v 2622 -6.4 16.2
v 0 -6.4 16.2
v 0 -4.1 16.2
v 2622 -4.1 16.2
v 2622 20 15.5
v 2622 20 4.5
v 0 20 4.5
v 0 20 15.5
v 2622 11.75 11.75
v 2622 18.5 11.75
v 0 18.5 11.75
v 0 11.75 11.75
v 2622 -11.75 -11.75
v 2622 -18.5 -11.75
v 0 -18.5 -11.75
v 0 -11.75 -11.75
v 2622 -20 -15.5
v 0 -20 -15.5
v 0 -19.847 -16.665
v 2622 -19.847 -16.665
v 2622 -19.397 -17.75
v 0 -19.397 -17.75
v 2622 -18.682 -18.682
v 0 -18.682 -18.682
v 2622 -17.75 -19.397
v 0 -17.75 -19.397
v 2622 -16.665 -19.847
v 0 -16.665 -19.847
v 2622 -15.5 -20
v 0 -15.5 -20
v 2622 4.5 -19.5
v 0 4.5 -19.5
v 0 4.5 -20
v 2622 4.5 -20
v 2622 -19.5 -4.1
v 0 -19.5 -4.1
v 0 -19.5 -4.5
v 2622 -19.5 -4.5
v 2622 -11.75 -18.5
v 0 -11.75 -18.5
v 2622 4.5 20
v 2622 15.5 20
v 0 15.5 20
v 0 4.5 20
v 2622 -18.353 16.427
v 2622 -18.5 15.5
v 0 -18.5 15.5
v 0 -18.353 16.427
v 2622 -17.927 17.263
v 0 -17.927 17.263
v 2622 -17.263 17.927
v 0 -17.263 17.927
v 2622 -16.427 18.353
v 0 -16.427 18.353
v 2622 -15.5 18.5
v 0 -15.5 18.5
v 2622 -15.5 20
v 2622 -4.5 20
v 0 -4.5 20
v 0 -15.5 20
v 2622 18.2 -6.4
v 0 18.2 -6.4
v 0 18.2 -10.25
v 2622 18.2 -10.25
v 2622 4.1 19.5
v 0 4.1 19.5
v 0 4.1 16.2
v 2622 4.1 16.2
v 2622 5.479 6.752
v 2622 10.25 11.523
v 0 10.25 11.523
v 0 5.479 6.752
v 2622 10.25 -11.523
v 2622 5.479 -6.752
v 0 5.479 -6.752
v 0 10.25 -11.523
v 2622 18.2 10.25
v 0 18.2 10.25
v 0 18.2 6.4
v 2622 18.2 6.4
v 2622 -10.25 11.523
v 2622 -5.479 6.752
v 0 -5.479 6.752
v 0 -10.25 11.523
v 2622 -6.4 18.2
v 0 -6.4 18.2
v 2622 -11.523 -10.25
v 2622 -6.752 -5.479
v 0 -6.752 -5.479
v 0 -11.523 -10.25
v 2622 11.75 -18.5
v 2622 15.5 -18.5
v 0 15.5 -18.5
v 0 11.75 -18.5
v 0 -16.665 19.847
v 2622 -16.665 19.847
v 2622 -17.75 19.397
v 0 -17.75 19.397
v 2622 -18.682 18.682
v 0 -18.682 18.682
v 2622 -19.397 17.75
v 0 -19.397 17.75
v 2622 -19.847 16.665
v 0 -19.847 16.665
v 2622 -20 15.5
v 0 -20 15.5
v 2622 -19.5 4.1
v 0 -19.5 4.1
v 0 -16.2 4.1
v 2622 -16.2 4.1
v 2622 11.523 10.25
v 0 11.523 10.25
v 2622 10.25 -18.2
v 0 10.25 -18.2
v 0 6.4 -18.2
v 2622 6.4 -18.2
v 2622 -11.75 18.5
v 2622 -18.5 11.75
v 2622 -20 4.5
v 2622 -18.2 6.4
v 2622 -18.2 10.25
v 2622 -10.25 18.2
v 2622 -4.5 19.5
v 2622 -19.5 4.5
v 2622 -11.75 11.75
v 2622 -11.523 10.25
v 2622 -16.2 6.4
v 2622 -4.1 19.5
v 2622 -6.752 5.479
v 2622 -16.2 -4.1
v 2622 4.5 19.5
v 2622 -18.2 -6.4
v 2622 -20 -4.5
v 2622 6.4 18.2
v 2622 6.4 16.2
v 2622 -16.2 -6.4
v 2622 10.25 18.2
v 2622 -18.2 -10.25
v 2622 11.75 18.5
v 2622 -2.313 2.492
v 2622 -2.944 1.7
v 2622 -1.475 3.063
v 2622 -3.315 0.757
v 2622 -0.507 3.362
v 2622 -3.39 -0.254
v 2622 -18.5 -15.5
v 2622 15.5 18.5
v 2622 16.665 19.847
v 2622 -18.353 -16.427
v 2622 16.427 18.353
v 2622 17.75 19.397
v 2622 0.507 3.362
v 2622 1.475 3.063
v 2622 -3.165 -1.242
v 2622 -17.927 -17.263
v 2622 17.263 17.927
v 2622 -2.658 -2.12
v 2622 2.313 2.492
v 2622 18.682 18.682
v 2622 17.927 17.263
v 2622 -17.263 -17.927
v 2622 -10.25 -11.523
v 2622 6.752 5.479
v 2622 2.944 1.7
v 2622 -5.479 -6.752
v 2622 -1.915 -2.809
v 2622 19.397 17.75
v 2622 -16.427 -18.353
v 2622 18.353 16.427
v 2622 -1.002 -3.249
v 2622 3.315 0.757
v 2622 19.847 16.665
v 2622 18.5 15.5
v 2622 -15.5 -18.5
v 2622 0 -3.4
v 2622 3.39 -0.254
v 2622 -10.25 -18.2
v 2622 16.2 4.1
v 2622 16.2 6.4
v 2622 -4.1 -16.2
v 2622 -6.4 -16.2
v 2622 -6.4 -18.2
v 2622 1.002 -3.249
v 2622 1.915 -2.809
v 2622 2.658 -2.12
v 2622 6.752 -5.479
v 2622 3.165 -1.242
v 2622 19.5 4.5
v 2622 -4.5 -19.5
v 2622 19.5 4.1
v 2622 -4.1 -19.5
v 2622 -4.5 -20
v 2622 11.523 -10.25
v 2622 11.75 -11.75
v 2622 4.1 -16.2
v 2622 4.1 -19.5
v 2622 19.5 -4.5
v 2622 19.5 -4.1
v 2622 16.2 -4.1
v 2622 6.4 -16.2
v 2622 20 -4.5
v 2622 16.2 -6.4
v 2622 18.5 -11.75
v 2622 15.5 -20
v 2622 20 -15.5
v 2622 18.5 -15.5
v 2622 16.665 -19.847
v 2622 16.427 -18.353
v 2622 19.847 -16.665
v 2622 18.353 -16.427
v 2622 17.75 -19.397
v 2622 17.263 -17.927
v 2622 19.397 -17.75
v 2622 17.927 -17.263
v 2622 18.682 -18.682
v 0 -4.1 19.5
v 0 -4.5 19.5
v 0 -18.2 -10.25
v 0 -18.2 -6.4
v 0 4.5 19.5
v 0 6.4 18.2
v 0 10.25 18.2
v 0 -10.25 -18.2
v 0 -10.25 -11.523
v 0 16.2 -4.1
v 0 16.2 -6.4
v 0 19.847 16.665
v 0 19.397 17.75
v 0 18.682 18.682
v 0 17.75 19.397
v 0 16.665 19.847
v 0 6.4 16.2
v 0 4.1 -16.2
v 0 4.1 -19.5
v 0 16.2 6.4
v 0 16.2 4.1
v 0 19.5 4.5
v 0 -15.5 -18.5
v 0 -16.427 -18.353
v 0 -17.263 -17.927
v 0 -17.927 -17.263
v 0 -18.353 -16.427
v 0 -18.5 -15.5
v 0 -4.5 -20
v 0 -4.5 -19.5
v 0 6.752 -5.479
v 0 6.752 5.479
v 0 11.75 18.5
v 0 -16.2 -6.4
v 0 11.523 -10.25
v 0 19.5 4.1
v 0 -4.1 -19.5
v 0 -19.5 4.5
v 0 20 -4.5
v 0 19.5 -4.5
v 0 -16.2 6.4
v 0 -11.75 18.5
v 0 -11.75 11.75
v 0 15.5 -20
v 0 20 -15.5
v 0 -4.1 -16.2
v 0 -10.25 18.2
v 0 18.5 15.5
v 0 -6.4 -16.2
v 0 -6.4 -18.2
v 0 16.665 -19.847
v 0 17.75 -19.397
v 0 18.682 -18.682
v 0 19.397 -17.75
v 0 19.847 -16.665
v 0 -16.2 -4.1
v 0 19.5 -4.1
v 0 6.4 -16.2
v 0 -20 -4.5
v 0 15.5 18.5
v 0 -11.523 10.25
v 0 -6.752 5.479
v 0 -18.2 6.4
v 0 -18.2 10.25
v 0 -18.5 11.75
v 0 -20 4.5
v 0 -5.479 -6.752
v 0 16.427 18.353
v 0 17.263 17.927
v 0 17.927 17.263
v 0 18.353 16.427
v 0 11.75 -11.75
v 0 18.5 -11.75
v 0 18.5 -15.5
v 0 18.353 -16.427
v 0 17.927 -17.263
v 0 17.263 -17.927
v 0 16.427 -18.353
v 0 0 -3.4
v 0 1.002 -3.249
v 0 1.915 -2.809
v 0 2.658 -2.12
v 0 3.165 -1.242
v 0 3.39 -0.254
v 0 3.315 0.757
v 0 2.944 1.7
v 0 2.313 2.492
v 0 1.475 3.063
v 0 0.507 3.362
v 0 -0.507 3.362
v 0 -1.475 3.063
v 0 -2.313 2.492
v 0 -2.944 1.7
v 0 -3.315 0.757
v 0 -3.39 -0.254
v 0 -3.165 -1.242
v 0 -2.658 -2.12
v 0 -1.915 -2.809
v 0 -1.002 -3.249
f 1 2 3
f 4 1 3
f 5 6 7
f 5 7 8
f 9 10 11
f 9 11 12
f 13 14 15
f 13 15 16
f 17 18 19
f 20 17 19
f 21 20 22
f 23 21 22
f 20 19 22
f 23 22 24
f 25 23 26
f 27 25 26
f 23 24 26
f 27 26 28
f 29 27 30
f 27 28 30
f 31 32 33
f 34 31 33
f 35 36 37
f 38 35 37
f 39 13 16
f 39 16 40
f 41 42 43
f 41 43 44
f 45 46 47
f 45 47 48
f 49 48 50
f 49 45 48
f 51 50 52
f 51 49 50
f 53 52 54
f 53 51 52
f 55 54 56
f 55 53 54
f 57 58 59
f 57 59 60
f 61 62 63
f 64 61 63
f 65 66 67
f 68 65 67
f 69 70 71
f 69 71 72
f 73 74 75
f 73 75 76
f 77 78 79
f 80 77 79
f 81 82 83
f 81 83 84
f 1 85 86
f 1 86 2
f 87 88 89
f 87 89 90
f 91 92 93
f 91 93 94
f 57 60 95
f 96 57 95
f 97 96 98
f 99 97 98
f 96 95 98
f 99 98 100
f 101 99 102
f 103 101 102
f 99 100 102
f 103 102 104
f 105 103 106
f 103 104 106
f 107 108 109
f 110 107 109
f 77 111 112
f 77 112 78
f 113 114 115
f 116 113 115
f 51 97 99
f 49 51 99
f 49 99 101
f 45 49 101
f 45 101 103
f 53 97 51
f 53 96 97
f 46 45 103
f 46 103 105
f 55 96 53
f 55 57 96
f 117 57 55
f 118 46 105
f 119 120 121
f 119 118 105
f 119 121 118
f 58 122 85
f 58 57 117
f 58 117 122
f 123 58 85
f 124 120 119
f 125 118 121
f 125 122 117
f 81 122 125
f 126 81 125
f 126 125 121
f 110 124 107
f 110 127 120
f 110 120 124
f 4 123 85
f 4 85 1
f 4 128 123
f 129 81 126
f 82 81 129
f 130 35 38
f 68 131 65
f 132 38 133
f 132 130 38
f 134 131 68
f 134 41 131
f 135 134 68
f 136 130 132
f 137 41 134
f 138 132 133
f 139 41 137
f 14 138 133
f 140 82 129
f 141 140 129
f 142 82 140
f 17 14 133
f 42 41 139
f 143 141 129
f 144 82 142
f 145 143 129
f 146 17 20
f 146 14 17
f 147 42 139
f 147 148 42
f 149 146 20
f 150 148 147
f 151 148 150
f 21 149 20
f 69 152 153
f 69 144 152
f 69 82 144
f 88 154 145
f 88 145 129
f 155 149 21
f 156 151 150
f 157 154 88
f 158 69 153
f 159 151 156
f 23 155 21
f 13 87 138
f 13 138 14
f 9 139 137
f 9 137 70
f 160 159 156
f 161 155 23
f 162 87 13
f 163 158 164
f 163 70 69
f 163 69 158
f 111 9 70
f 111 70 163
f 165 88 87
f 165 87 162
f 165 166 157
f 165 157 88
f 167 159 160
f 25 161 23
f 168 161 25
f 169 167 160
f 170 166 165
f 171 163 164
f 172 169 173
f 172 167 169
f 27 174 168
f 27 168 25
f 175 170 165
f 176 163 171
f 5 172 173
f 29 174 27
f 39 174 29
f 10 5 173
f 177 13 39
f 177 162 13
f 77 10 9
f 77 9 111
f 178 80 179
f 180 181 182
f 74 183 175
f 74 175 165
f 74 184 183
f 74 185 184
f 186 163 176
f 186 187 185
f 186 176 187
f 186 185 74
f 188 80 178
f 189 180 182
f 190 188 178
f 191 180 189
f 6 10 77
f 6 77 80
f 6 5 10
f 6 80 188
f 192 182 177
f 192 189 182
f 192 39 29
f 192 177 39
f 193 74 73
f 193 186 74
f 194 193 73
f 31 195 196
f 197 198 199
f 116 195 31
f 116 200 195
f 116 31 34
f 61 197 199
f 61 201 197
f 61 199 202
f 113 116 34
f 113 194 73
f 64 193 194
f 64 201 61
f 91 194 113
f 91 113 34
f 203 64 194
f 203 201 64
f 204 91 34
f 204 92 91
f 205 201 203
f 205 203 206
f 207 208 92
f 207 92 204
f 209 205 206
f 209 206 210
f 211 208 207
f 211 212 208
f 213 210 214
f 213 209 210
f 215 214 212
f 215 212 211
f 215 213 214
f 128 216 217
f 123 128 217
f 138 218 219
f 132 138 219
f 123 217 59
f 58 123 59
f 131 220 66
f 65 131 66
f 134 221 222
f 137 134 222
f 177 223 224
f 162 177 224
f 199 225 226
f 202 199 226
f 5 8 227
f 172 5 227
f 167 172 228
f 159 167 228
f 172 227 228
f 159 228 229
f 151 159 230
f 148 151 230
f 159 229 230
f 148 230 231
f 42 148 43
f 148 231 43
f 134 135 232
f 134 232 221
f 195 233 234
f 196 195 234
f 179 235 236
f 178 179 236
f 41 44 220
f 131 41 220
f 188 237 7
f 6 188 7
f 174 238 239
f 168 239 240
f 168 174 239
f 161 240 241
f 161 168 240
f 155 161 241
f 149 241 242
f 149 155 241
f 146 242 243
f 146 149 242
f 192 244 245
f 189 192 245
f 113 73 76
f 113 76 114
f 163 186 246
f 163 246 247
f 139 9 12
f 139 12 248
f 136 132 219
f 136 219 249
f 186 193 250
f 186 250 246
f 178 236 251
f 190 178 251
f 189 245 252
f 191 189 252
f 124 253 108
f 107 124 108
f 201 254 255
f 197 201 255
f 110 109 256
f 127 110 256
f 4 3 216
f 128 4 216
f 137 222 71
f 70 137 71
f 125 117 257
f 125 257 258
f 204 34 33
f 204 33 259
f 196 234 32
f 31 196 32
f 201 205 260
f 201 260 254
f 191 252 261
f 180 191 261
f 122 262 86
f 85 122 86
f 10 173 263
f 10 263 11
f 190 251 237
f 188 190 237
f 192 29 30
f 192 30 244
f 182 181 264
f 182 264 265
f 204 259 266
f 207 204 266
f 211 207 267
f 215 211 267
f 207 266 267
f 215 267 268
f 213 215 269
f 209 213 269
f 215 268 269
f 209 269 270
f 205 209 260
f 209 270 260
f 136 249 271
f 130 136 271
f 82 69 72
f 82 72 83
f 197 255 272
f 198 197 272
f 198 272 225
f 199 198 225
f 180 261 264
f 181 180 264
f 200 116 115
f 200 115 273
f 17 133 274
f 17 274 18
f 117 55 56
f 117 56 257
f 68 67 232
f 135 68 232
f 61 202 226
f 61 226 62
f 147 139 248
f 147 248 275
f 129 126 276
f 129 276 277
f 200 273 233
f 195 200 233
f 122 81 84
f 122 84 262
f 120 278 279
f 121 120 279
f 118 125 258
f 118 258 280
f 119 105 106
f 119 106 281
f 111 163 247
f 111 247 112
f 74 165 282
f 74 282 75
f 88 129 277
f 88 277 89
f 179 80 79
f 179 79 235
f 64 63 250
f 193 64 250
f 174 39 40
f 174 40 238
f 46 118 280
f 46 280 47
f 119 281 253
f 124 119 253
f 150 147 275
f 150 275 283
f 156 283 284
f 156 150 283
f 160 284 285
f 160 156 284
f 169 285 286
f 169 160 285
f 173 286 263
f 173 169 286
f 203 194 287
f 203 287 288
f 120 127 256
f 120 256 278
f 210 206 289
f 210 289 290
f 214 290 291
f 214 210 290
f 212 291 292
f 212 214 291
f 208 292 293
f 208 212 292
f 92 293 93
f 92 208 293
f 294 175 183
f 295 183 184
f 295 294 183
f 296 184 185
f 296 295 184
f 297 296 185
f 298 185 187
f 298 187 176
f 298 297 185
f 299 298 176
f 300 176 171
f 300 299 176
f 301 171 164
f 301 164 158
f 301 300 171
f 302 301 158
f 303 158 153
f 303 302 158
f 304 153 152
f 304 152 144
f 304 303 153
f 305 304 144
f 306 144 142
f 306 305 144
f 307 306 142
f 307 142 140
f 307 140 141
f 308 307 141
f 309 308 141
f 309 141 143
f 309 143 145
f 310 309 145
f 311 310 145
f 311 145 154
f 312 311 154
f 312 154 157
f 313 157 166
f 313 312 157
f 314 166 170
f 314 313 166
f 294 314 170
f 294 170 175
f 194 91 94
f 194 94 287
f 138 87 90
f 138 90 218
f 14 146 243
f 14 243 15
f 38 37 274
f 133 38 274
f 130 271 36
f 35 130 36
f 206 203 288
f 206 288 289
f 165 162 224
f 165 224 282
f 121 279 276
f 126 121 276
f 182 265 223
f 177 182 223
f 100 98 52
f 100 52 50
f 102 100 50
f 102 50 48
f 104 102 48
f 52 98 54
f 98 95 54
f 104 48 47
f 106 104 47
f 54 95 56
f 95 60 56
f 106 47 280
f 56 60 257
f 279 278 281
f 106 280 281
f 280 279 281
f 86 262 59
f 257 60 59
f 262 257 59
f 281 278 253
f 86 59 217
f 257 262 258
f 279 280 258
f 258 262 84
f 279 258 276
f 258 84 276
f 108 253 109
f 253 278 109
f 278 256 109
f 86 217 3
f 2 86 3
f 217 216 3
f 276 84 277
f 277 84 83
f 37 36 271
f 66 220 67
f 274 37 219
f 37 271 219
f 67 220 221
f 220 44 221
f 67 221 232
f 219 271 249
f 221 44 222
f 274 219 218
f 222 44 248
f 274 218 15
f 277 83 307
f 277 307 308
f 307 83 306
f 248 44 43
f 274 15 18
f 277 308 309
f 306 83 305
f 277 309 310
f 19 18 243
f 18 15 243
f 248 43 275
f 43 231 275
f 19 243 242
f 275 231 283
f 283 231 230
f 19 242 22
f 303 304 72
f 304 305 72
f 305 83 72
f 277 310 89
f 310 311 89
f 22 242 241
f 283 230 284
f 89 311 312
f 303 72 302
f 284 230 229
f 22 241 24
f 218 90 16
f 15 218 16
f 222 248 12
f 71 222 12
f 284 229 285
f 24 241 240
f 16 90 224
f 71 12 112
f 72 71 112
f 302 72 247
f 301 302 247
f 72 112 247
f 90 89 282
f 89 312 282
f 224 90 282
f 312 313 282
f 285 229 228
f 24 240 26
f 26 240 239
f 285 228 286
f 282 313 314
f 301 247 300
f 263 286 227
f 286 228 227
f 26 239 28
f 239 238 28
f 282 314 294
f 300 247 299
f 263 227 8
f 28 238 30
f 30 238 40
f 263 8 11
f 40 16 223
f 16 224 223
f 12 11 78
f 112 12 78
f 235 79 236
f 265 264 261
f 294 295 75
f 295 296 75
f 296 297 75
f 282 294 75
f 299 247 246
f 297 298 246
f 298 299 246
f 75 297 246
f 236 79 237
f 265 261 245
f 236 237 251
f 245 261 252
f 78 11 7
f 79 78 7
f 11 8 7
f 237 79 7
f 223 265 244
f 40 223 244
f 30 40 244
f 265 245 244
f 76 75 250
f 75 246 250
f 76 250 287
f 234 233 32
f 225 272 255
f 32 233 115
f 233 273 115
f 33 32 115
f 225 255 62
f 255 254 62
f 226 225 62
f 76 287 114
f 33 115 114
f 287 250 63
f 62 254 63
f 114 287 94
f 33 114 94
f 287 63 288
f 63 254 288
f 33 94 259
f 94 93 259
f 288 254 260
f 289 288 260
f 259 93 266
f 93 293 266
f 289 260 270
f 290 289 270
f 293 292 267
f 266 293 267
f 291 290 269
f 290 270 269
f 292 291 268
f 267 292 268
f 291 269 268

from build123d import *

# Parameters (mm, degrees)
SKETCH_3_R          = 3.4
EXTRUDE_1_DEPTH     = 2622
CUT_EXTRUDE_3_DEPTH = 3297


with BuildPart() as part:
    # 草图3 → 凸台-拉伸1 (new body)
    with BuildSketch(Plane(origin=(0, 0, 0), x_dir=(0, 0, -1), z_dir=(1, 0, 0))):
        with BuildLine():
            Line((-15.5, -20), (-4.5, -20))
            Line((-4.5, -20), (-4.5, -19.5))
            Line((-4.5, -19.5), (-4.1, -19.5))
            Line((-4.1, -19.5), (-4.1, -16.2))
            Line((-4.1, -16.2), (-6.4, -16.2))
            Line((-6.4, -16.2), (-6.4, -18.2))
            Line((-6.4, -18.2), (-10.25, -18.2))
            Line((-10.25, -18.2), (-10.25, -11.522792206))
            Line((-10.25, -11.522792206), (-5.479130441, -6.751922647))
            Line((-5.479130441, -6.751922647), (5.479130441, -6.751922647))
            Line((5.479130441, -6.751922647), (10.25, -11.522792206))
            Line((10.25, -11.522792206), (10.25, -18.2))
            Line((10.25, -18.2), (6.4, -18.2))
            Line((6.4, -18.2), (6.4, -16.2))
            Line((6.4, -16.2), (4.1, -16.2))
            Line((4.1, -16.2), (4.1, -19.5))
            Line((4.1, -19.5), (4.5, -19.5))
            Line((4.5, -19.5), (4.5, -20))
            Line((4.5, -20), (15.5, -20))
            ThreePointArc((15.5, -20), (18.681980515, -18.681980515), (20, -15.5))
            Line((20, -15.5), (20, -4.5))
            Line((20, -4.5), (19.5, -4.5))
            Line((19.5, -4.5), (19.5, -4.1))
            Line((19.5, -4.1), (16.2, -4.1))
            Line((16.2, -4.1), (16.2, -6.4))
            Line((16.2, -6.4), (18.2, -6.4))
            Line((18.2, -6.4), (18.2, -10.25))
            Line((18.2, -10.25), (11.522792206, -10.25))
            Line((11.522792206, -10.25), (6.751922647, -5.479130441))
            Line((6.751922647, -5.479130441), (6.751922647, 5.479130441))
            Line((6.751922647, 5.479130441), (11.522792206, 10.25))
            Line((11.522792206, 10.25), (18.2, 10.25))
            Line((18.2, 10.25), (18.2, 6.4))
            Line((18.2, 6.4), (16.2, 6.4))
            Line((16.2, 6.4), (16.2, 4.1))
            Line((16.2, 4.1), (19.5, 4.1))
            Line((19.5, 4.1), (19.5, 4.5))
            Line((19.5, 4.5), (20, 4.5))
            Line((20, 4.5), (20, 15.5))
            ThreePointArc((20, 15.5), (18.681980515, 18.681980515), (15.5, 20))
            Line((15.5, 20), (4.5, 20))
            Line((4.5, 20), (4.5, 19.5))
            Line((4.5, 19.5), (4.1, 19.5))
            Line((4.1, 19.5), (4.1, 16.2))
            Line((4.1, 16.2), (6.4, 16.2))
            Line((6.4, 16.2), (6.4, 18.2))
            Line((6.4, 18.2), (10.25, 18.2))
            Line((10.25, 18.2), (10.25, 11.522792206))
            Line((10.25, 11.522792206), (5.479130441, 6.751922647))
            Line((5.479130441, 6.751922647), (-5.479130441, 6.751922647))
            Line((-5.479130441, 6.751922647), (-10.25, 11.522792206))
            Line((-10.25, 11.522792206), (-10.25, 18.2))
            Line((-10.25, 18.2), (-6.4, 18.2))
            Line((-6.4, 18.2), (-6.4, 16.2))
            Line((-6.4, 16.2), (-4.1, 16.2))
            Line((-4.1, 16.2), (-4.1, 19.5))
            Line((-4.1, 19.5), (-4.5, 19.5))
            Line((-4.5, 19.5), (-4.5, 20))
            Line((-4.5, 20), (-15.5, 20))
            ThreePointArc((-15.5, 20), (-18.681980515, 18.681980515), (-20, 15.5))
            Line((-20, 15.5), (-20, 4.5))
            Line((-20, 4.5), (-19.5, 4.5))
            Line((-19.5, 4.5), (-19.5, 4.1))
            Line((-19.5, 4.1), (-16.2, 4.1))
            Line((-16.2, 4.1), (-16.2, 6.4))
            Line((-16.2, 6.4), (-18.2, 6.4))
            Line((-18.2, 6.4), (-18.2, 10.25))
            Line((-18.2, 10.25), (-11.522792206, 10.25))
            Line((-11.522792206, 10.25), (-6.751922647, 5.479130441))
            Line((-6.751922647, 5.479130441), (-6.751922647, -5.479130441))
            Line((-6.751922647, -5.479130441), (-11.522792206, -10.25))
            Line((-11.522792206, -10.25), (-18.2, -10.25))
            Line((-18.2, -10.25), (-18.2, -6.4))
            Line((-18.2, -6.4), (-16.2, -6.4))
            Line((-16.2, -6.4), (-16.2, -4.1))
            Line((-16.2, -4.1), (-19.5, -4.1))
            Line((-19.5, -4.1), (-19.5, -4.5))
            Line((-19.5, -4.5), (-20, -4.5))
            Line((-20, -4.5), (-20, -15.5))
            ThreePointArc((-20, -15.5), (-18.681980515, -18.681980515), (-15.5, -20))
        make_face()
        Circle(SKETCH_3_R, mode=Mode.SUBTRACT)
    extrude(amount=EXTRUDE_1_DEPTH)

    # 草图4 → 切除-拉伸3 (cut)
    with BuildSketch(Plane(origin=(2622, -20, 15.5), x_dir=(0, 0, 1), z_dir=(-1, 0, 0))):
        with BuildLine():
            Line((-3.75, 31.75), (3, 31.75))
            Line((3, 31.75), (3, 35.5))
            ThreePointArc((3, 35.5), (2.121320344, 37.621320344), (0, 38.5))
            Line((0, 38.5), (-3.75, 38.5))
            Line((-3.75, 38.5), (-3.75, 31.75))
        make_face()
        with BuildLine():
            Line((-3.75, 8.25), (-3.75, 1.5))
            Line((-3.75, 1.5), (0, 1.5))
            ThreePointArc((0, 1.5), (2.121320344, 2.378679656), (3, 4.5))
            Line((3, 4.5), (3, 8.25))
            Line((3, 8.25), (-3.75, 8.25))
        make_face()
        with BuildLine():
            Line((-27.25, 8.25), (-34, 8.25))
            Line((-34, 8.25), (-34, 4.5))
            ThreePointArc((-34, 4.5), (-33.121320344, 2.378679656), (-31, 1.5))
            Line((-31, 1.5), (-27.25, 1.5))
            Line((-27.25, 1.5), (-27.25, 8.25))
        make_face()
        with BuildLine():
            Line((-27.25, 31.75), (-27.25, 38.5))
            Line((-27.25, 38.5), (-31, 38.5))
            ThreePointArc((-31, 38.5), (-33.121320344, 37.621320344), (-34, 35.5))
            Line((-34, 35.5), (-34, 31.75))
            Line((-34, 31.75), (-27.25, 31.75))
        make_face()
    extrude(amount=CUT_EXTRUDE_3_DEPTH, mode=Mode.SUBTRACT)


solid = part.part
